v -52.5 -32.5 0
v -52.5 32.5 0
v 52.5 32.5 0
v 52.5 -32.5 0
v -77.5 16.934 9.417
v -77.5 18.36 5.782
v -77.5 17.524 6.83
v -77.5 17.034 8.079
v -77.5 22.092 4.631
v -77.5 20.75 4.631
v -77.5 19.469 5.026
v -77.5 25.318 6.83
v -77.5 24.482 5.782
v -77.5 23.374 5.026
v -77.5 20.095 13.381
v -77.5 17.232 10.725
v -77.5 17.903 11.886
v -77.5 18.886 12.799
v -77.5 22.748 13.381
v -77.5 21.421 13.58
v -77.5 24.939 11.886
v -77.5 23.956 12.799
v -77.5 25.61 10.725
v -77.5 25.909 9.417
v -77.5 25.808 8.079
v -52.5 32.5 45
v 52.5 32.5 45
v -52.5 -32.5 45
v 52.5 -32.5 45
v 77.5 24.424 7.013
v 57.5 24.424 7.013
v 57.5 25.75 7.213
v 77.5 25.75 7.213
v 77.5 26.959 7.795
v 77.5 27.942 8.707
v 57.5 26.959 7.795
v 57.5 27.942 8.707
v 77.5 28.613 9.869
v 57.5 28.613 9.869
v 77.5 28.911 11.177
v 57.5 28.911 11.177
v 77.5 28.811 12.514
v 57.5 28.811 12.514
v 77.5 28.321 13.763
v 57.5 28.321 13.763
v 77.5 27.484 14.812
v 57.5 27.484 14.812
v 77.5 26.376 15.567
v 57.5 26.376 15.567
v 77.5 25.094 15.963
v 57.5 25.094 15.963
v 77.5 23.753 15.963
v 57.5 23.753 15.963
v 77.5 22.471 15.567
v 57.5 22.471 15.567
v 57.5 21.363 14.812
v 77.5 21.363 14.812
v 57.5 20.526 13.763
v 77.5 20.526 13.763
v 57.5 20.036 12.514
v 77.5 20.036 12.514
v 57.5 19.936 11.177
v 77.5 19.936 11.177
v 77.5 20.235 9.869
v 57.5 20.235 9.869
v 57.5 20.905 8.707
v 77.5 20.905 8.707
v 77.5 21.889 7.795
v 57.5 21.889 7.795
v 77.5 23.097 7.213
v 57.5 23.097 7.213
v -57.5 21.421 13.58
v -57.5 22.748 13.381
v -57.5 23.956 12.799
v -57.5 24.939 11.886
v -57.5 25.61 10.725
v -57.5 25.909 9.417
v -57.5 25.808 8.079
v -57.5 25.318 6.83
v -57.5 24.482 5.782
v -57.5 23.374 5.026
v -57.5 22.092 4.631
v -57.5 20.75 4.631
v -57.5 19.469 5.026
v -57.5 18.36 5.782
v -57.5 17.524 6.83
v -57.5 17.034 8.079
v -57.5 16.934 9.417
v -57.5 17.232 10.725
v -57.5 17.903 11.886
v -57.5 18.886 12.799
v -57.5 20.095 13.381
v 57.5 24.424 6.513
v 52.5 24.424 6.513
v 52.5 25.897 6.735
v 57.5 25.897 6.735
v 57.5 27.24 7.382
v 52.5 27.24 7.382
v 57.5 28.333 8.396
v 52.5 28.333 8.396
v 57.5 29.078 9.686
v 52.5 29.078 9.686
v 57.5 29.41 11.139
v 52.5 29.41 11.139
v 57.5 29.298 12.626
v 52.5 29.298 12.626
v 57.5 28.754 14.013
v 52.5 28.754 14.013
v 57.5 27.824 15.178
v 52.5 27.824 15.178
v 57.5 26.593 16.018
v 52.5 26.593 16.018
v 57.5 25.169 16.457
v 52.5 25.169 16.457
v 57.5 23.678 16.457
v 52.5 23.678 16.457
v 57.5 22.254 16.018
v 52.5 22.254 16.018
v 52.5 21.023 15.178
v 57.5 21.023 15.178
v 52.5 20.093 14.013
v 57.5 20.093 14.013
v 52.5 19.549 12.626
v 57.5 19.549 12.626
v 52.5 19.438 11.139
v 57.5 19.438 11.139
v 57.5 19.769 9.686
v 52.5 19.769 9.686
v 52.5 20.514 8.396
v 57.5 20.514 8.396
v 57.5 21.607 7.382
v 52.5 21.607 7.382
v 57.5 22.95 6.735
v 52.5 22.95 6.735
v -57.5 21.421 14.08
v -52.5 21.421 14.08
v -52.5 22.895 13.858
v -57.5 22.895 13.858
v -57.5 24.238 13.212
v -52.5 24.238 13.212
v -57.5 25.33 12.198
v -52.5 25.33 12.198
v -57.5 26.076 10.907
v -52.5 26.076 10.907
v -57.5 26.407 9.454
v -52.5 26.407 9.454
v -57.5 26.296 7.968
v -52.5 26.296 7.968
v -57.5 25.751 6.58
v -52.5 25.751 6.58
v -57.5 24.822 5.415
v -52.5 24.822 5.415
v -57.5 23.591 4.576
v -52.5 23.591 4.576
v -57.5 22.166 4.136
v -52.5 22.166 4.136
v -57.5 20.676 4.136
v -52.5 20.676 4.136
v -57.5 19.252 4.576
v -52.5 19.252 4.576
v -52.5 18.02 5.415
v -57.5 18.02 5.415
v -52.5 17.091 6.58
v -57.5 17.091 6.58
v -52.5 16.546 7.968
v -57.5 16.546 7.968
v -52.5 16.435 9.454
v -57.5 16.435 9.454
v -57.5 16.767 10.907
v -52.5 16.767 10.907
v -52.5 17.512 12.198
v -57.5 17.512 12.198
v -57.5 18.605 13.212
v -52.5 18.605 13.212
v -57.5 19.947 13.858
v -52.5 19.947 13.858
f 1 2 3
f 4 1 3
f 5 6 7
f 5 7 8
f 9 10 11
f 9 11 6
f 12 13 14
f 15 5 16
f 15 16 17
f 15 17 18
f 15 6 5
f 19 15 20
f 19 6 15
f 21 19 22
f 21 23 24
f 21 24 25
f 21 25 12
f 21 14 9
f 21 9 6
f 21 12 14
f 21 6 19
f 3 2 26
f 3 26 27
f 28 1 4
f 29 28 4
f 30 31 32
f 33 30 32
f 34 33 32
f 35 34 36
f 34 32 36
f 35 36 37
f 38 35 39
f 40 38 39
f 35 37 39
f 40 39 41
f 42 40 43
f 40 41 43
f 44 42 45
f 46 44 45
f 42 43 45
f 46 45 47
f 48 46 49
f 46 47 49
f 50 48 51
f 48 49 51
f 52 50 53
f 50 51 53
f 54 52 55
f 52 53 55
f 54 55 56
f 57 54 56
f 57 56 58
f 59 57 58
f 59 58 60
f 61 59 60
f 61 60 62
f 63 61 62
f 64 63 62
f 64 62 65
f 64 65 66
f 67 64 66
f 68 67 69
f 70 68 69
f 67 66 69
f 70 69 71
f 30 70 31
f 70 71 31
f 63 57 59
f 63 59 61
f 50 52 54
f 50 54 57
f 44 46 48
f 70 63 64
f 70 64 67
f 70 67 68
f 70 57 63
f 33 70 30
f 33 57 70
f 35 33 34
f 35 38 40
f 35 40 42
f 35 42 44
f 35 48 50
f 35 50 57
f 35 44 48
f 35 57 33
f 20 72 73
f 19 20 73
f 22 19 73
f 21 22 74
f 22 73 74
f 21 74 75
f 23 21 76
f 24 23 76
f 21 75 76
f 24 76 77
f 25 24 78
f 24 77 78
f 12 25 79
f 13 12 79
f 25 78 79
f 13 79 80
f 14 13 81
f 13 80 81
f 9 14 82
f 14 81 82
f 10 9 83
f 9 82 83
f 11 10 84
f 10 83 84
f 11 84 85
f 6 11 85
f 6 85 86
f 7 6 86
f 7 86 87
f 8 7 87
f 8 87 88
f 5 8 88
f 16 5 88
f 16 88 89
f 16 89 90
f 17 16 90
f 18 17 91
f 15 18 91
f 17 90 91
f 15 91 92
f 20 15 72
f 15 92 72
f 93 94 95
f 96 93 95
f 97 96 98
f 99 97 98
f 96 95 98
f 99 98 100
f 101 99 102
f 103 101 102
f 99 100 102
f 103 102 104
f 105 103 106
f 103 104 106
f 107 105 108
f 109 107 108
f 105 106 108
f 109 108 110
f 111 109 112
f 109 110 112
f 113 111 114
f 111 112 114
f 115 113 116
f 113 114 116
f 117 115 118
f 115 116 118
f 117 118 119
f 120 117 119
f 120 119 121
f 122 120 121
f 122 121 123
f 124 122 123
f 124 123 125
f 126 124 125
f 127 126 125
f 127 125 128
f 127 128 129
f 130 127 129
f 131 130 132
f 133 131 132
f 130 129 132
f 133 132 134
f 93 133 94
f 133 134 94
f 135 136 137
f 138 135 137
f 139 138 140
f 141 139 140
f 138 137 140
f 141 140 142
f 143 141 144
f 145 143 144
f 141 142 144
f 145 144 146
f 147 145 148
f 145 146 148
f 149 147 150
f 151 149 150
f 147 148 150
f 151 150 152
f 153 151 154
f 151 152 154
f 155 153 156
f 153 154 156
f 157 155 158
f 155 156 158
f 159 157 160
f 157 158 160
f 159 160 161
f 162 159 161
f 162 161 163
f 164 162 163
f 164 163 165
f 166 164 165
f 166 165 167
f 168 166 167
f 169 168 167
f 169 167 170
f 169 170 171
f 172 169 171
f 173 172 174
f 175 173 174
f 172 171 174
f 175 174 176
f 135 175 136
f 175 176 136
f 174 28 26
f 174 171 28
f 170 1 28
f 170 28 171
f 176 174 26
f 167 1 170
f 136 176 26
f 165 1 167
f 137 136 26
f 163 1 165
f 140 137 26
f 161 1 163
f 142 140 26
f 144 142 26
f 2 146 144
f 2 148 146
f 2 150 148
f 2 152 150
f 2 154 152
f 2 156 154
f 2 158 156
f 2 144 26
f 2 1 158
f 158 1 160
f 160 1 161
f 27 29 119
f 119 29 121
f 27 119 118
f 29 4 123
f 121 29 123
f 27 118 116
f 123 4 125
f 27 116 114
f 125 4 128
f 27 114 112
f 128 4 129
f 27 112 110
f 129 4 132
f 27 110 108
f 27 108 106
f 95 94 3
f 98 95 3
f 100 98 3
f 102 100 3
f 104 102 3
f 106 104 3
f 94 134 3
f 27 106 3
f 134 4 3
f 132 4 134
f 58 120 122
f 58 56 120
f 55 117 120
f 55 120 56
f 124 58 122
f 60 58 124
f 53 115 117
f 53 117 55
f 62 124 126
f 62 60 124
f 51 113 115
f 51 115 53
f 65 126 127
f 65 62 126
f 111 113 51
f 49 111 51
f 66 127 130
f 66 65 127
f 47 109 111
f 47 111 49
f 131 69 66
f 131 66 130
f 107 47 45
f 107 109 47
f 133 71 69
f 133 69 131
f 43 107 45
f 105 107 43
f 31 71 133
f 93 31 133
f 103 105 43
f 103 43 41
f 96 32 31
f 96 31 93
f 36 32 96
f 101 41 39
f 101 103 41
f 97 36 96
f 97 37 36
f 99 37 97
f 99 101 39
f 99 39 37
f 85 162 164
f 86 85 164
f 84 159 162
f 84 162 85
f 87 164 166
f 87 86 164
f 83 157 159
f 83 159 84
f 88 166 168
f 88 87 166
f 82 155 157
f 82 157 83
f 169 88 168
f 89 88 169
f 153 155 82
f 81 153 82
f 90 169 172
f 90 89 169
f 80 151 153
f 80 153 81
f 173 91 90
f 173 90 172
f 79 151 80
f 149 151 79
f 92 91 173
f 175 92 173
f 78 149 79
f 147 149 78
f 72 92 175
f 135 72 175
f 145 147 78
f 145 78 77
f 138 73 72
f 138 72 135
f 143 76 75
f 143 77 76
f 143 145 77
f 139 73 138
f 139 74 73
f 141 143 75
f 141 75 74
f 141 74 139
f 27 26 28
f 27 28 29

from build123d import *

# Parameters (mm, degrees)
SKETCH1_W           = 105
SKETCH1_H           = 65
BOSS_EXTRUDE1_DEPTH = 45
SKETCH2_R           = 5
BOSS_EXTRUDE2_DEPTH = 5
SKETCH3_R           = 4.5
BOSS_EXTRUDE3_DEPTH = 20
SKETCH4_R           = 5
BOSS_EXTRUDE4_DEPTH = 5
SKETCH5_R           = 4.5
BOSS_EXTRUDE5_DEPTH = 20


with BuildPart() as part:
    # Sketch1 → Boss-Extrude1 (new body)
    with BuildSketch(Plane.XY):
        Rectangle(SKETCH1_W, SKETCH1_H)
    extrude(amount=BOSS_EXTRUDE1_DEPTH)

    # Sketch2 → Boss-Extrude2 (add)
    with BuildSketch(Plane.ZY.offset(52.5)):
        with Locations((9.080491803, 21.421132833)):
            Circle(SKETCH2_R)
    extrude(amount=BOSS_EXTRUDE2_DEPTH)

    # Sketch3 → Boss-Extrude3 (add)
    with BuildSketch(Plane.ZY.offset(57.5)):
        with Locations((9.080491803, 21.421132833)):
            Circle(SKETCH3_R)
    extrude(amount=BOSS_EXTRUDE3_DEPTH)

    # Sketch4 → Boss-Extrude4 (add)
    with BuildSketch(Plane(origin=(52.5, 0, 0), x_dir=(0, 0, -1), z_dir=(1, 0, 0))):
        with Locations((-11.51313285, 24.423590695)):
            Circle(SKETCH4_R)
    extrude(amount=BOSS_EXTRUDE4_DEPTH)

    # Sketch5 → Boss-Extrude5 (add)
    with BuildSketch(Plane(origin=(57.5, 0, 0), x_dir=(0, 0, -1), z_dir=(1, 0, 0))):
        with Locations((-11.51313285, 24.423590695)):
            Circle(SKETCH5_R)
    extrude(amount=BOSS_EXTRUDE5_DEPTH)


solid = part.part
